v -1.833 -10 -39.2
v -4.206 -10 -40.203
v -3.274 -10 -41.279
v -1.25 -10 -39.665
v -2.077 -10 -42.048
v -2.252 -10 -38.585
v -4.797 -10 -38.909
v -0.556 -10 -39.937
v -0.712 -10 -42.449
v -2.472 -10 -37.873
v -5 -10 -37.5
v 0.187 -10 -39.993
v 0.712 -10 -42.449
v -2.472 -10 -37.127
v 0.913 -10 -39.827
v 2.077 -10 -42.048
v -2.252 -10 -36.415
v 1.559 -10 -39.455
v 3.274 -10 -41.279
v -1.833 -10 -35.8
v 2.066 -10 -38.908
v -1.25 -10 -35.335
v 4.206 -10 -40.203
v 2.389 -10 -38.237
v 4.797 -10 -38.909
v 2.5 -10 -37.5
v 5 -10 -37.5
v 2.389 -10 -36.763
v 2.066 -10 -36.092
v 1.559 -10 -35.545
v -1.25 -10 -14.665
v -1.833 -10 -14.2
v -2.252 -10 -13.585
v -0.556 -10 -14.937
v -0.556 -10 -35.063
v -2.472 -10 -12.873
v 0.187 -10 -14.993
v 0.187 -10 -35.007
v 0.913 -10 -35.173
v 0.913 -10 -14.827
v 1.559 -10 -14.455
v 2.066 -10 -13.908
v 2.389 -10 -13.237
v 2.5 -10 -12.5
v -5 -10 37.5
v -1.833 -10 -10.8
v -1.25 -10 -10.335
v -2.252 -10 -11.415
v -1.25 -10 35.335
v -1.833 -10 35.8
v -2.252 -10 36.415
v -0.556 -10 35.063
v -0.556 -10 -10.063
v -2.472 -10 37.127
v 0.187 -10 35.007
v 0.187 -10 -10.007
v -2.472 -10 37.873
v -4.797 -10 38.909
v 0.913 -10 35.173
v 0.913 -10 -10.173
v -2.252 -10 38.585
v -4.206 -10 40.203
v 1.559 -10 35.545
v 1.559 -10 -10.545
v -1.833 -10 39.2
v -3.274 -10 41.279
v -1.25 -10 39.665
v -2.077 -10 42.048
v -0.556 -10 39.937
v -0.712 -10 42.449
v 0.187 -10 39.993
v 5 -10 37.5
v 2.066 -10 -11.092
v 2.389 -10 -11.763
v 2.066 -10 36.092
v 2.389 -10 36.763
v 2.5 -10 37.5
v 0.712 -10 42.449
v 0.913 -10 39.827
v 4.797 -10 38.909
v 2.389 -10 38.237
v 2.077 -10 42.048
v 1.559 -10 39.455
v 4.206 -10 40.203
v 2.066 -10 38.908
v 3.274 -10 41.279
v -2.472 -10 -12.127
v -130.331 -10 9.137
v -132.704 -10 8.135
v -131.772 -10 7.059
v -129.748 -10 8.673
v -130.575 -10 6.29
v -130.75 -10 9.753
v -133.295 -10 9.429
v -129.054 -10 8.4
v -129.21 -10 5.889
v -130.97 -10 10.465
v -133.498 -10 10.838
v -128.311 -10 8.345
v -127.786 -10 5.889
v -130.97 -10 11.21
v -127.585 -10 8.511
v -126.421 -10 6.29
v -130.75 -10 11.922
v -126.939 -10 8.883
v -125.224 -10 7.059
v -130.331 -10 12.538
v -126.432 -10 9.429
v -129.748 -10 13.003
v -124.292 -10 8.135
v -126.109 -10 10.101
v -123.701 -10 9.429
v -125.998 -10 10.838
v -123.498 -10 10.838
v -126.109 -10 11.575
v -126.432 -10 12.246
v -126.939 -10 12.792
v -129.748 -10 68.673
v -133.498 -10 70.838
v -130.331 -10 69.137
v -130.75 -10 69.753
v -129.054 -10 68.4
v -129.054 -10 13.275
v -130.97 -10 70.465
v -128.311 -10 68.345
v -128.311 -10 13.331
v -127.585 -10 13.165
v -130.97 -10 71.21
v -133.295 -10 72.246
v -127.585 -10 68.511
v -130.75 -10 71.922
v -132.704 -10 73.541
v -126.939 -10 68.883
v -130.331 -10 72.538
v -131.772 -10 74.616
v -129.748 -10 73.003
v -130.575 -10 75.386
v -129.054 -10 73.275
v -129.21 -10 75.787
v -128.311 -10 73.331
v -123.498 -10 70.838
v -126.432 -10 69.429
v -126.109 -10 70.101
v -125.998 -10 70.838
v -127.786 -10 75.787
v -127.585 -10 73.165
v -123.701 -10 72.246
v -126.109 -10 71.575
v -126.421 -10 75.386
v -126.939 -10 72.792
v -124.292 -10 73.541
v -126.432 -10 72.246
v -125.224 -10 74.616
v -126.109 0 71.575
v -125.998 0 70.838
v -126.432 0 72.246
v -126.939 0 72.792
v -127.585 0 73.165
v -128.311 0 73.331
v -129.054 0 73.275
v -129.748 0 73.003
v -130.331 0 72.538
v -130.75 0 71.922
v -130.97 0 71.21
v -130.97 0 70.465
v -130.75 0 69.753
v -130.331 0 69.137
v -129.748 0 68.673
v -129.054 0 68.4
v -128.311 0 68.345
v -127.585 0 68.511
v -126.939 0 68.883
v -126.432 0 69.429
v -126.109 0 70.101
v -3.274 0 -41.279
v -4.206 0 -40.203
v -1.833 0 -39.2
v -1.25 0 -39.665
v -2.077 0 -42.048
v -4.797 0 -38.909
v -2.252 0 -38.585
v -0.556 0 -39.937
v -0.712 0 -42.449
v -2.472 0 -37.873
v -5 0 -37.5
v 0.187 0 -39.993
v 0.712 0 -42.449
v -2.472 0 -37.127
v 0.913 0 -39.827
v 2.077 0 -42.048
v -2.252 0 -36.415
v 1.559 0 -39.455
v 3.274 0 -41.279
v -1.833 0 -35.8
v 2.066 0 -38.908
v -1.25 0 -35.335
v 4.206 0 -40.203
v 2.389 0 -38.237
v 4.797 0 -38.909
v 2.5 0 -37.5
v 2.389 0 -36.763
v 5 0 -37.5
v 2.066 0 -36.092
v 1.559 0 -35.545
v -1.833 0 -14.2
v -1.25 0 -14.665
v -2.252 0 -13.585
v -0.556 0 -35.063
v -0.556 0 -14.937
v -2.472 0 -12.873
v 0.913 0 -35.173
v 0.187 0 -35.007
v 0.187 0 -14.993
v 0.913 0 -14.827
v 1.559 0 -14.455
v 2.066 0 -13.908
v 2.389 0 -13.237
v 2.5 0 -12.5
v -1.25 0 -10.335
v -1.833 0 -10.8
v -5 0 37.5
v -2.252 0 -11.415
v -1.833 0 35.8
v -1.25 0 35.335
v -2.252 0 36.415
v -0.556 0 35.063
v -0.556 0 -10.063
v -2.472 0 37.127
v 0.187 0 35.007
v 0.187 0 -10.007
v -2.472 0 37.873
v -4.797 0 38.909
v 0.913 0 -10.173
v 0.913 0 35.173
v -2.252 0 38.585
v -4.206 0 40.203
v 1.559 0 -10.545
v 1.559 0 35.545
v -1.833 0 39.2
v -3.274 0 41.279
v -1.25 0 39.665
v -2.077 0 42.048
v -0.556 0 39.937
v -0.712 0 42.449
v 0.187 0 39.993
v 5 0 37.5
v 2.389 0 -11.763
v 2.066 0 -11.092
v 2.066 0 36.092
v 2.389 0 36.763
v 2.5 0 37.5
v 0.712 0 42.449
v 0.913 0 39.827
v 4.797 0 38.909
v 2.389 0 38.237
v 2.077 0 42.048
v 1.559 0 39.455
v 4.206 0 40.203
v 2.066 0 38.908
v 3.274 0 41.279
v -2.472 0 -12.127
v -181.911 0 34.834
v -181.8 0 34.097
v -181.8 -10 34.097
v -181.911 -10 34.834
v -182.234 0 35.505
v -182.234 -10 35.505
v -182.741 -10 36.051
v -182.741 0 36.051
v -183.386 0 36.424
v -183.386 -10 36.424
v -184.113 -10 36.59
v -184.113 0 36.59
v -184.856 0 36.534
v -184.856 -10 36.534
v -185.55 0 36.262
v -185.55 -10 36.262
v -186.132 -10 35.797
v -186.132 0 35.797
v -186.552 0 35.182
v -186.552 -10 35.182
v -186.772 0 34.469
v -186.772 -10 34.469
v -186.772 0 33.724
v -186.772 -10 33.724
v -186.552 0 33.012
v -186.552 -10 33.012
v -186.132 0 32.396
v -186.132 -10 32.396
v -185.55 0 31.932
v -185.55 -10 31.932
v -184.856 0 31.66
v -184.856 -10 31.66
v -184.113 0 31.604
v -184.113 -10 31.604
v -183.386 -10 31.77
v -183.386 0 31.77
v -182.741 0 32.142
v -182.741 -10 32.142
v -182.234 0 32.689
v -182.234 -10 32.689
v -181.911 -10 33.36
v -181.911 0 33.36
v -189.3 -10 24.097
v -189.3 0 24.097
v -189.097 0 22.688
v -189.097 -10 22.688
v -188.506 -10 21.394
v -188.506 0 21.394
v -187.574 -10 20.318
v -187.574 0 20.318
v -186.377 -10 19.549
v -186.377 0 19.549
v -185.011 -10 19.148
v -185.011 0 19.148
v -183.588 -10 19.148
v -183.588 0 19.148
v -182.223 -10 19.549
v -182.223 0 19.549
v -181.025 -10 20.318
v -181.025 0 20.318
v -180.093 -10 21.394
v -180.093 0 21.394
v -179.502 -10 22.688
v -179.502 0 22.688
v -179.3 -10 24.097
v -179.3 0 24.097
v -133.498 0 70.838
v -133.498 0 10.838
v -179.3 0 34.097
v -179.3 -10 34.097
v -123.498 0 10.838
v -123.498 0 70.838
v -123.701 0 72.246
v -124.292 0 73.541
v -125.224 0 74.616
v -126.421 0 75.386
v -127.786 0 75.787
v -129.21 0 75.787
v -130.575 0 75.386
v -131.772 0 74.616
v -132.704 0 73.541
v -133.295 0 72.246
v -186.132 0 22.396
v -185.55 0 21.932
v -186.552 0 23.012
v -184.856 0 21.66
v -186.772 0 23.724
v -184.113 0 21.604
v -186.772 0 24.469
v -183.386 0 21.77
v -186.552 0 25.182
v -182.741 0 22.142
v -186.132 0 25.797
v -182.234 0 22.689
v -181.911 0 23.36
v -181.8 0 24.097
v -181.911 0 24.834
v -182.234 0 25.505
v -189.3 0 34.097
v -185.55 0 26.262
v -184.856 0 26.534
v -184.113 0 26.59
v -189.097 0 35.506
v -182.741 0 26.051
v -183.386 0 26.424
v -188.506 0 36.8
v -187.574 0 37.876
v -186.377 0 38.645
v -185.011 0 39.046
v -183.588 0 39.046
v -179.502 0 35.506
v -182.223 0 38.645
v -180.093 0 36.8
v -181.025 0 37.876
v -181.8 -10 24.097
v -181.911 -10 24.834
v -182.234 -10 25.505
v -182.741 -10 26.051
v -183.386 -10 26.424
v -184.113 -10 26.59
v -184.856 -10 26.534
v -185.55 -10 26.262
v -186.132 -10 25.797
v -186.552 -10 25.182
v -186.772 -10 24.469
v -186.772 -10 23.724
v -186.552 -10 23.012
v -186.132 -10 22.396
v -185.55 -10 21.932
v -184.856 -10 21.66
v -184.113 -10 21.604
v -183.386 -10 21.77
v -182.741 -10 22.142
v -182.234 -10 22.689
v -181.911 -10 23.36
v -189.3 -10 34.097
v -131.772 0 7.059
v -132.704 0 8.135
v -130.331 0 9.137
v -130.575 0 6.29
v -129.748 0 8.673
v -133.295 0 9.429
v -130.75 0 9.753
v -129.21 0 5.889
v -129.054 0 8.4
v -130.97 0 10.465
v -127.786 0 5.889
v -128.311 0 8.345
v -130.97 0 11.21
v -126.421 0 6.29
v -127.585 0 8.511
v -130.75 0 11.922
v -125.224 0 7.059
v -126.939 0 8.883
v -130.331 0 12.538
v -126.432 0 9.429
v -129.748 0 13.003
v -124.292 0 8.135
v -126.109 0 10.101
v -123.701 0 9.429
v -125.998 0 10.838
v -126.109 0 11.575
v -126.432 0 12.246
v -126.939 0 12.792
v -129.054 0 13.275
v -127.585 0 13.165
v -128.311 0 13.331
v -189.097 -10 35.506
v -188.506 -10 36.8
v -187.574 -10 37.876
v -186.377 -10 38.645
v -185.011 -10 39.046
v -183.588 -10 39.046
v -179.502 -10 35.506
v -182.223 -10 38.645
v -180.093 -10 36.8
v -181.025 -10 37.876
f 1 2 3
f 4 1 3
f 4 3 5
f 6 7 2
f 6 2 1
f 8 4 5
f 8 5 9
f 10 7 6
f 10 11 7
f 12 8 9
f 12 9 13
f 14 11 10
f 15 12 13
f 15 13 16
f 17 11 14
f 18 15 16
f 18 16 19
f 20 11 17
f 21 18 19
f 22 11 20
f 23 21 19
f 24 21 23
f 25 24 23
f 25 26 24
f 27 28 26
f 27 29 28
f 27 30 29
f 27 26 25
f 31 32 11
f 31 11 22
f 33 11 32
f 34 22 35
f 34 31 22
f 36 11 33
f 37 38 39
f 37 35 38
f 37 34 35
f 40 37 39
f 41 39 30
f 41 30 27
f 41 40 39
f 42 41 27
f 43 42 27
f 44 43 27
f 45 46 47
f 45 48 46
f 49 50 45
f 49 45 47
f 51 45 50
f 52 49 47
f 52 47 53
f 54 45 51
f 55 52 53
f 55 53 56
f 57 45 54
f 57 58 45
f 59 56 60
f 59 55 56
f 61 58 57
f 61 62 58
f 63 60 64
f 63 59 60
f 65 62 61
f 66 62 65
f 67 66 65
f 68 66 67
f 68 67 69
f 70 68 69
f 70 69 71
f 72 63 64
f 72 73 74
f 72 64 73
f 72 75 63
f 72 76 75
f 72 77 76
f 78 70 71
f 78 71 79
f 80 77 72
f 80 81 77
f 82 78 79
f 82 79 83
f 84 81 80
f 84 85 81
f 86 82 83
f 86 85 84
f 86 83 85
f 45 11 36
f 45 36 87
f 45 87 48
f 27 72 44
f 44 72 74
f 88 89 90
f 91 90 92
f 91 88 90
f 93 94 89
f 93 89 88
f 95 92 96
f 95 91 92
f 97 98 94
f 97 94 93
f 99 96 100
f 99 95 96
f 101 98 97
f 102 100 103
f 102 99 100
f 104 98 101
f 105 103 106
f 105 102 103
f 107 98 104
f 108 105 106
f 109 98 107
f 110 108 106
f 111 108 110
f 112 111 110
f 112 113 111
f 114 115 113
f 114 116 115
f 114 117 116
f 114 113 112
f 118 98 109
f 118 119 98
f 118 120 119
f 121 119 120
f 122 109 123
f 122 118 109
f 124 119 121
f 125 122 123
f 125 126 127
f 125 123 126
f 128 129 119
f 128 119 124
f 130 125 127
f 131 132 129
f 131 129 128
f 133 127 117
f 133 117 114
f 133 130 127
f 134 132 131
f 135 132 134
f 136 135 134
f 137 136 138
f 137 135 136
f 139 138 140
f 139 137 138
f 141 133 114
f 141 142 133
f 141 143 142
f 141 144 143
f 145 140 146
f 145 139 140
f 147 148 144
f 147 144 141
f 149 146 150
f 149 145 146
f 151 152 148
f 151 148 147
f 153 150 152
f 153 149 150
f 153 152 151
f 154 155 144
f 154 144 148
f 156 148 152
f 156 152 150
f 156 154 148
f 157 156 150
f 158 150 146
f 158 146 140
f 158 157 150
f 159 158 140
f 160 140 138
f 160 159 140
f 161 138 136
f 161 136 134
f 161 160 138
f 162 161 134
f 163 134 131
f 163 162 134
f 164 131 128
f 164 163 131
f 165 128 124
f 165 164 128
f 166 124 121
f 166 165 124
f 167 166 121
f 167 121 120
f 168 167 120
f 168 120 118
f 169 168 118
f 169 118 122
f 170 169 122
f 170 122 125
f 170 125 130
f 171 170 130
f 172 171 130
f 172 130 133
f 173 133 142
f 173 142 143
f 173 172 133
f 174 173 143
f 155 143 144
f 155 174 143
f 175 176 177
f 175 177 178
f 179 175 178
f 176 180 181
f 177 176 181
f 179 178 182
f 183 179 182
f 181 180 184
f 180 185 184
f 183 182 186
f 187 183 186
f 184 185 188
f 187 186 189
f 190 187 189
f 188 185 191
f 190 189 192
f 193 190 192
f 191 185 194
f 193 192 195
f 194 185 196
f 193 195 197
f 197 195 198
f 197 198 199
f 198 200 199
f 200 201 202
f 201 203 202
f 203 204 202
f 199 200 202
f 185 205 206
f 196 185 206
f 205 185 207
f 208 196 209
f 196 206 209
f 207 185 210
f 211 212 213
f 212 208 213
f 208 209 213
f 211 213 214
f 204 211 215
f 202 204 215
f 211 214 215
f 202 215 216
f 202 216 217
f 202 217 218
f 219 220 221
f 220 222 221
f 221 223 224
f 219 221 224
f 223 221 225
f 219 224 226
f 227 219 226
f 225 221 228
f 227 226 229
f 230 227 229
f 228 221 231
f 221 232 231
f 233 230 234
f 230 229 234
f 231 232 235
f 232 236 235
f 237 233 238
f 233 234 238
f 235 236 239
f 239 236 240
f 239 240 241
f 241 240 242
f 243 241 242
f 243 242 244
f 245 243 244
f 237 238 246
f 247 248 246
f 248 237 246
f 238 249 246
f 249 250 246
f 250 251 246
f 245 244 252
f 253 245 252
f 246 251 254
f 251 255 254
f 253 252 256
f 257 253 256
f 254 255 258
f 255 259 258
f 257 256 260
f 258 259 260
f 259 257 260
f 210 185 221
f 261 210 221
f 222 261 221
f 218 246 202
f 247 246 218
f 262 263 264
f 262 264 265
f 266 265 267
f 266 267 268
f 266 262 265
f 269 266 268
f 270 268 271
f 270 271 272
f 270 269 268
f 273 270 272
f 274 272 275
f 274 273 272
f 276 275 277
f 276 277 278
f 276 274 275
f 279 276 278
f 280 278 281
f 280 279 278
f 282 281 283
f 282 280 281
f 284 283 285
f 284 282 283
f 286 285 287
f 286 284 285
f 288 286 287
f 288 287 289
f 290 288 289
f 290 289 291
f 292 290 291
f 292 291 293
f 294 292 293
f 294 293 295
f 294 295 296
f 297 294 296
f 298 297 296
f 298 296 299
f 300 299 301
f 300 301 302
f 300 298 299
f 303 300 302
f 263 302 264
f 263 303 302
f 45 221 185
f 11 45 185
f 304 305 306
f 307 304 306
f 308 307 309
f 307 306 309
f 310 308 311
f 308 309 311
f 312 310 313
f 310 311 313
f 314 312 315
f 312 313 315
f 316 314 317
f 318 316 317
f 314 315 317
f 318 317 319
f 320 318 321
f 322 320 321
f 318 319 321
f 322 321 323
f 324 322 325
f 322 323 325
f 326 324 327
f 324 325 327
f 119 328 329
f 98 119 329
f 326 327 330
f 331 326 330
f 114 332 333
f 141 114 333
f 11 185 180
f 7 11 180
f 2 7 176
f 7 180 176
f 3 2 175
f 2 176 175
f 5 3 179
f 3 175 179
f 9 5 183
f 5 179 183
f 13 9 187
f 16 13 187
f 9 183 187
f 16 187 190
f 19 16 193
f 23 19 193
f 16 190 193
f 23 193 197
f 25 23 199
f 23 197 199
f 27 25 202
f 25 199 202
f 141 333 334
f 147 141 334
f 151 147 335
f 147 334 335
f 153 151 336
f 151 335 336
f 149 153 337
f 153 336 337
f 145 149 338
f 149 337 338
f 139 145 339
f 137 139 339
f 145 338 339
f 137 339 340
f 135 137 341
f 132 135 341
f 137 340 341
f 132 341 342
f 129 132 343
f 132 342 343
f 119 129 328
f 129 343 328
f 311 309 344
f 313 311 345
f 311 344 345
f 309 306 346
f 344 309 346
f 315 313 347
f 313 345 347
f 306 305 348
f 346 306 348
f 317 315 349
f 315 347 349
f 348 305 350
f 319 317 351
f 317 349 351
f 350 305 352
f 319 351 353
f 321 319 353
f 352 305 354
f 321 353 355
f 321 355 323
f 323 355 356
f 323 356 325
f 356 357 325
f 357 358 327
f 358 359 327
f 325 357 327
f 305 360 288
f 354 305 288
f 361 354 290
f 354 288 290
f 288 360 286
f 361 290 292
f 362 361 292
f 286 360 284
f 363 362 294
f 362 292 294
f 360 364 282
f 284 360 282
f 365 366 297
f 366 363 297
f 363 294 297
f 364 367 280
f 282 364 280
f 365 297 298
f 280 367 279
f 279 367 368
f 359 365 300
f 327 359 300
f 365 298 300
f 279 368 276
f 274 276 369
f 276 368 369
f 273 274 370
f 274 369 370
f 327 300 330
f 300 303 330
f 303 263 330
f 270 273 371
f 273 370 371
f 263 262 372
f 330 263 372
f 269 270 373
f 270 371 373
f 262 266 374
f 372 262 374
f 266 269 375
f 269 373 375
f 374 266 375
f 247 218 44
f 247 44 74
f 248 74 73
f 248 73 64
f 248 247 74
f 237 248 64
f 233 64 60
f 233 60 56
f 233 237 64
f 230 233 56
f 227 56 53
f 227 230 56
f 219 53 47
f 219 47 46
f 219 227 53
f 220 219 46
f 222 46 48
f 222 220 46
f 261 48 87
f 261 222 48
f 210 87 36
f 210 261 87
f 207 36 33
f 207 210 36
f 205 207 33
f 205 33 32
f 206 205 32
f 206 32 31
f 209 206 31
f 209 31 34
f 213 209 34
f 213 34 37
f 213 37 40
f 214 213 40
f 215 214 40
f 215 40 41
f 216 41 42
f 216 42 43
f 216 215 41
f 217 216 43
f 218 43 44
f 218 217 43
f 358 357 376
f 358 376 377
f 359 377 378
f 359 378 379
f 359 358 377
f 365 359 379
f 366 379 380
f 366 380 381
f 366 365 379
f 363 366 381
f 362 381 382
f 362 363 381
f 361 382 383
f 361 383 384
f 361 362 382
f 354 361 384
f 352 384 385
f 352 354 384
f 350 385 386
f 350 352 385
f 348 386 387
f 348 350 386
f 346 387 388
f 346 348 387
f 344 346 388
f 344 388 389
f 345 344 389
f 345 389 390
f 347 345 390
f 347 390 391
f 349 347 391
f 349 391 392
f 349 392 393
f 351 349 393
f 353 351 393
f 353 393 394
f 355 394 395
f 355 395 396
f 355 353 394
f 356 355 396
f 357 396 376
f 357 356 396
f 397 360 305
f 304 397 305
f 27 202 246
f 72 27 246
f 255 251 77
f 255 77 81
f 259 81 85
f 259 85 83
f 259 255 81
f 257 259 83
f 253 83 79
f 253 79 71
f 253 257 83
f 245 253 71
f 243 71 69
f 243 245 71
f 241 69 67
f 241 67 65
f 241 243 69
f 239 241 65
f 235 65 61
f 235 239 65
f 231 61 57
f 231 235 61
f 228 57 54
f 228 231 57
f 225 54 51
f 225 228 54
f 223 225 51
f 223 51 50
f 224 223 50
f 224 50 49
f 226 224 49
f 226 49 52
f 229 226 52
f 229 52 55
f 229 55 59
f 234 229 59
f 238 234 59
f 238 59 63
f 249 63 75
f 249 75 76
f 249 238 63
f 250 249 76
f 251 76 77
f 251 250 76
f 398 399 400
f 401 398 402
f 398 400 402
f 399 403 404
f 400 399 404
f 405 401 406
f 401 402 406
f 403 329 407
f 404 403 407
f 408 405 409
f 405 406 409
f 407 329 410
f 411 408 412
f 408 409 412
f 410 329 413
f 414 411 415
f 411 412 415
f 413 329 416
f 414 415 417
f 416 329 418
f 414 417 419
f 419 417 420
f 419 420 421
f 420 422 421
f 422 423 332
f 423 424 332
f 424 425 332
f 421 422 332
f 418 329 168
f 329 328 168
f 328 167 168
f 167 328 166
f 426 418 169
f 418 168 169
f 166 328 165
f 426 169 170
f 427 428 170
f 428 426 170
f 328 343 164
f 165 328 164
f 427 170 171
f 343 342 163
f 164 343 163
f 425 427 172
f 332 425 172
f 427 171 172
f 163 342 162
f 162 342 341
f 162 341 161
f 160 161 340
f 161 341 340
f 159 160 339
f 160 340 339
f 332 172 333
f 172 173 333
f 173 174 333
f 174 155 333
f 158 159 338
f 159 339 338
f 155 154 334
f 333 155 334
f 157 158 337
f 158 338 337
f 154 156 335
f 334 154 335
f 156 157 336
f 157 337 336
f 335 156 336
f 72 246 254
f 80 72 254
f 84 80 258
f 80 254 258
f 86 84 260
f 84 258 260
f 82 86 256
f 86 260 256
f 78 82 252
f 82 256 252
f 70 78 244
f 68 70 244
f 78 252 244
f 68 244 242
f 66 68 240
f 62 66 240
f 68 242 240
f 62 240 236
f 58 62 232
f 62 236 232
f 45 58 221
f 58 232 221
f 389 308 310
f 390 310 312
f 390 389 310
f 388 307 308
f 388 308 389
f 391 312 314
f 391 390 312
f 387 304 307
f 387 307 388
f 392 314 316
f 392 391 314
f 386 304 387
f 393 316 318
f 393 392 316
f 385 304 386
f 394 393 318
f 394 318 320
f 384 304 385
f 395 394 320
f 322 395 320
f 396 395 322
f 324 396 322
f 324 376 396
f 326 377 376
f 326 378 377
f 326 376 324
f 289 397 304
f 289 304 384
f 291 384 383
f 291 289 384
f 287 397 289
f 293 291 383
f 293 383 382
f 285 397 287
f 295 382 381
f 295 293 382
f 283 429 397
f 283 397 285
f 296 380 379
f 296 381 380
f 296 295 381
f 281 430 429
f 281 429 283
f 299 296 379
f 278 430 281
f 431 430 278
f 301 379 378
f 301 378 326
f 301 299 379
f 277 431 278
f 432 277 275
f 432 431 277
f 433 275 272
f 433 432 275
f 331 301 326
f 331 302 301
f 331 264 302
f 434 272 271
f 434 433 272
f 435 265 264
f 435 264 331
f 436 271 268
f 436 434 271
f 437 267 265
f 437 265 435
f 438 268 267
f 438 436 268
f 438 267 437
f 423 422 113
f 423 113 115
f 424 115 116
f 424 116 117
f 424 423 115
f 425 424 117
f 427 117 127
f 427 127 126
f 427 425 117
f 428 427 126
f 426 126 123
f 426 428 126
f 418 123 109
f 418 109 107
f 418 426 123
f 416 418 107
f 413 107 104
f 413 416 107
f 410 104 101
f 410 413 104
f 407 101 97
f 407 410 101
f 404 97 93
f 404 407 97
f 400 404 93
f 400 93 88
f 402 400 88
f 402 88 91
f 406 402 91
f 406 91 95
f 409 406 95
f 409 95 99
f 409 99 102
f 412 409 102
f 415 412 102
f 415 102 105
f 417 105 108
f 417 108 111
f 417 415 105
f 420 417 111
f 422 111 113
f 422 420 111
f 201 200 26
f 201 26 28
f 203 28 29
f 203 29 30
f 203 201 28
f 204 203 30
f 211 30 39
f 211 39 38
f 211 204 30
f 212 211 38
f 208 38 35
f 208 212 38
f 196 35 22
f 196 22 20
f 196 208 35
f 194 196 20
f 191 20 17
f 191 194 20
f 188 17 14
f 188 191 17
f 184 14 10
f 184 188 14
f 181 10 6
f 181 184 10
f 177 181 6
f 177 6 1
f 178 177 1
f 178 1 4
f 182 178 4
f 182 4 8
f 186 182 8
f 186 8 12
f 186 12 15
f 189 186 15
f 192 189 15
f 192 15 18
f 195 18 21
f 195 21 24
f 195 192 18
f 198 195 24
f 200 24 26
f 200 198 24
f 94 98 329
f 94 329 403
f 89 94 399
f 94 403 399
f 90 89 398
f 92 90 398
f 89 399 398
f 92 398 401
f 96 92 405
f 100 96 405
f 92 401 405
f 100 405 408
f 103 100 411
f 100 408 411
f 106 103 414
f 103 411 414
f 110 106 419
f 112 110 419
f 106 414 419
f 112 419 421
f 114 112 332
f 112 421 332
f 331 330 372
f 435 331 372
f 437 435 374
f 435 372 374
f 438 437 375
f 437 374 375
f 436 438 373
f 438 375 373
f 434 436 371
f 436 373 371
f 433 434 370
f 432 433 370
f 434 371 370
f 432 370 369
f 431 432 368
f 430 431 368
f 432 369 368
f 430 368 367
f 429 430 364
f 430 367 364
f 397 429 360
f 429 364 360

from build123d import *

# Parameters (mm, degrees)
F0_R     = 2.5
F1_DEPTH = 10
F2_R     = 2.5
F3_DEPTH = 10
F4_R     = 2.5
F5_DEPTH = 10


with BuildPart() as f1:
    # F0 (on Front) → F1 (new body)
    with BuildSketch(Plane.XZ):
        with BuildLine():
            ThreePointArc((5, 37.5), (0, 42.5), (-5, 37.5))
            Line((-5, 37.5), (-5, -37.5))
            ThreePointArc((-5, -37.5), (0, -42.5), (5, -37.5))
            Line((5, -37.5), (5, 37.5))
        make_face()
        with Locations((0, -37.5)):
            Circle(F0_R, mode=Mode.SUBTRACT)
        with Locations((0, -12.5)):
            Circle(F0_R, mode=Mode.SUBTRACT)
        with Locations((0, 37.5)):
            Circle(F0_R, mode=Mode.SUBTRACT)
    extrude(amount=F1_DEPTH)


with BuildPart() as f3:
    # F2 (on Front) → F3 (new body)
    with BuildSketch(Plane.XZ):
        with BuildLine():
            ThreePointArc((-123.498, 70.837746), (-128.498, 75.837746), (-133.498, 70.837746))
            Line((-133.498, 70.837746), (-133.498, 10.837746))
            ThreePointArc((-133.498, 10.837746), (-128.498, 5.837746), (-123.498, 10.837746))
            Line((-123.498, 10.837746), (-123.498, 70.837746))
        make_face()
        with Locations((-128.498, 10.837746)):
            Circle(F2_R, mode=Mode.SUBTRACT)
        with Locations((-128.498, 70.837746)):
            Circle(F2_R, mode=Mode.SUBTRACT)
    extrude(amount=F3_DEPTH)


with BuildPart() as f5:
    # F4 (on Front) → F5 (new body)
    with BuildSketch(Plane.XZ):
        with BuildLine():
            ThreePointArc((-179.299712, 34.096847), (-184.299712, 39.096847), (-189.299712, 34.096847))
            Line((-189.299712, 34.096847), (-189.299712, 24.096847))
            ThreePointArc((-189.299712, 24.096847), (-184.299712, 19.096847), (-179.299712, 24.096847))
            Line((-179.299712, 24.096847), (-179.299712, 34.096847))
        make_face()
        with Locations((-184.299712, 24.096847)):
            Circle(F4_R, mode=Mode.SUBTRACT)
        with Locations((-184.299712, 34.096847)):
            Circle(F4_R, mode=Mode.SUBTRACT)
    extrude(amount=F5_DEPTH)


solid = Compound([f1.part, f3.part, f5.part])
